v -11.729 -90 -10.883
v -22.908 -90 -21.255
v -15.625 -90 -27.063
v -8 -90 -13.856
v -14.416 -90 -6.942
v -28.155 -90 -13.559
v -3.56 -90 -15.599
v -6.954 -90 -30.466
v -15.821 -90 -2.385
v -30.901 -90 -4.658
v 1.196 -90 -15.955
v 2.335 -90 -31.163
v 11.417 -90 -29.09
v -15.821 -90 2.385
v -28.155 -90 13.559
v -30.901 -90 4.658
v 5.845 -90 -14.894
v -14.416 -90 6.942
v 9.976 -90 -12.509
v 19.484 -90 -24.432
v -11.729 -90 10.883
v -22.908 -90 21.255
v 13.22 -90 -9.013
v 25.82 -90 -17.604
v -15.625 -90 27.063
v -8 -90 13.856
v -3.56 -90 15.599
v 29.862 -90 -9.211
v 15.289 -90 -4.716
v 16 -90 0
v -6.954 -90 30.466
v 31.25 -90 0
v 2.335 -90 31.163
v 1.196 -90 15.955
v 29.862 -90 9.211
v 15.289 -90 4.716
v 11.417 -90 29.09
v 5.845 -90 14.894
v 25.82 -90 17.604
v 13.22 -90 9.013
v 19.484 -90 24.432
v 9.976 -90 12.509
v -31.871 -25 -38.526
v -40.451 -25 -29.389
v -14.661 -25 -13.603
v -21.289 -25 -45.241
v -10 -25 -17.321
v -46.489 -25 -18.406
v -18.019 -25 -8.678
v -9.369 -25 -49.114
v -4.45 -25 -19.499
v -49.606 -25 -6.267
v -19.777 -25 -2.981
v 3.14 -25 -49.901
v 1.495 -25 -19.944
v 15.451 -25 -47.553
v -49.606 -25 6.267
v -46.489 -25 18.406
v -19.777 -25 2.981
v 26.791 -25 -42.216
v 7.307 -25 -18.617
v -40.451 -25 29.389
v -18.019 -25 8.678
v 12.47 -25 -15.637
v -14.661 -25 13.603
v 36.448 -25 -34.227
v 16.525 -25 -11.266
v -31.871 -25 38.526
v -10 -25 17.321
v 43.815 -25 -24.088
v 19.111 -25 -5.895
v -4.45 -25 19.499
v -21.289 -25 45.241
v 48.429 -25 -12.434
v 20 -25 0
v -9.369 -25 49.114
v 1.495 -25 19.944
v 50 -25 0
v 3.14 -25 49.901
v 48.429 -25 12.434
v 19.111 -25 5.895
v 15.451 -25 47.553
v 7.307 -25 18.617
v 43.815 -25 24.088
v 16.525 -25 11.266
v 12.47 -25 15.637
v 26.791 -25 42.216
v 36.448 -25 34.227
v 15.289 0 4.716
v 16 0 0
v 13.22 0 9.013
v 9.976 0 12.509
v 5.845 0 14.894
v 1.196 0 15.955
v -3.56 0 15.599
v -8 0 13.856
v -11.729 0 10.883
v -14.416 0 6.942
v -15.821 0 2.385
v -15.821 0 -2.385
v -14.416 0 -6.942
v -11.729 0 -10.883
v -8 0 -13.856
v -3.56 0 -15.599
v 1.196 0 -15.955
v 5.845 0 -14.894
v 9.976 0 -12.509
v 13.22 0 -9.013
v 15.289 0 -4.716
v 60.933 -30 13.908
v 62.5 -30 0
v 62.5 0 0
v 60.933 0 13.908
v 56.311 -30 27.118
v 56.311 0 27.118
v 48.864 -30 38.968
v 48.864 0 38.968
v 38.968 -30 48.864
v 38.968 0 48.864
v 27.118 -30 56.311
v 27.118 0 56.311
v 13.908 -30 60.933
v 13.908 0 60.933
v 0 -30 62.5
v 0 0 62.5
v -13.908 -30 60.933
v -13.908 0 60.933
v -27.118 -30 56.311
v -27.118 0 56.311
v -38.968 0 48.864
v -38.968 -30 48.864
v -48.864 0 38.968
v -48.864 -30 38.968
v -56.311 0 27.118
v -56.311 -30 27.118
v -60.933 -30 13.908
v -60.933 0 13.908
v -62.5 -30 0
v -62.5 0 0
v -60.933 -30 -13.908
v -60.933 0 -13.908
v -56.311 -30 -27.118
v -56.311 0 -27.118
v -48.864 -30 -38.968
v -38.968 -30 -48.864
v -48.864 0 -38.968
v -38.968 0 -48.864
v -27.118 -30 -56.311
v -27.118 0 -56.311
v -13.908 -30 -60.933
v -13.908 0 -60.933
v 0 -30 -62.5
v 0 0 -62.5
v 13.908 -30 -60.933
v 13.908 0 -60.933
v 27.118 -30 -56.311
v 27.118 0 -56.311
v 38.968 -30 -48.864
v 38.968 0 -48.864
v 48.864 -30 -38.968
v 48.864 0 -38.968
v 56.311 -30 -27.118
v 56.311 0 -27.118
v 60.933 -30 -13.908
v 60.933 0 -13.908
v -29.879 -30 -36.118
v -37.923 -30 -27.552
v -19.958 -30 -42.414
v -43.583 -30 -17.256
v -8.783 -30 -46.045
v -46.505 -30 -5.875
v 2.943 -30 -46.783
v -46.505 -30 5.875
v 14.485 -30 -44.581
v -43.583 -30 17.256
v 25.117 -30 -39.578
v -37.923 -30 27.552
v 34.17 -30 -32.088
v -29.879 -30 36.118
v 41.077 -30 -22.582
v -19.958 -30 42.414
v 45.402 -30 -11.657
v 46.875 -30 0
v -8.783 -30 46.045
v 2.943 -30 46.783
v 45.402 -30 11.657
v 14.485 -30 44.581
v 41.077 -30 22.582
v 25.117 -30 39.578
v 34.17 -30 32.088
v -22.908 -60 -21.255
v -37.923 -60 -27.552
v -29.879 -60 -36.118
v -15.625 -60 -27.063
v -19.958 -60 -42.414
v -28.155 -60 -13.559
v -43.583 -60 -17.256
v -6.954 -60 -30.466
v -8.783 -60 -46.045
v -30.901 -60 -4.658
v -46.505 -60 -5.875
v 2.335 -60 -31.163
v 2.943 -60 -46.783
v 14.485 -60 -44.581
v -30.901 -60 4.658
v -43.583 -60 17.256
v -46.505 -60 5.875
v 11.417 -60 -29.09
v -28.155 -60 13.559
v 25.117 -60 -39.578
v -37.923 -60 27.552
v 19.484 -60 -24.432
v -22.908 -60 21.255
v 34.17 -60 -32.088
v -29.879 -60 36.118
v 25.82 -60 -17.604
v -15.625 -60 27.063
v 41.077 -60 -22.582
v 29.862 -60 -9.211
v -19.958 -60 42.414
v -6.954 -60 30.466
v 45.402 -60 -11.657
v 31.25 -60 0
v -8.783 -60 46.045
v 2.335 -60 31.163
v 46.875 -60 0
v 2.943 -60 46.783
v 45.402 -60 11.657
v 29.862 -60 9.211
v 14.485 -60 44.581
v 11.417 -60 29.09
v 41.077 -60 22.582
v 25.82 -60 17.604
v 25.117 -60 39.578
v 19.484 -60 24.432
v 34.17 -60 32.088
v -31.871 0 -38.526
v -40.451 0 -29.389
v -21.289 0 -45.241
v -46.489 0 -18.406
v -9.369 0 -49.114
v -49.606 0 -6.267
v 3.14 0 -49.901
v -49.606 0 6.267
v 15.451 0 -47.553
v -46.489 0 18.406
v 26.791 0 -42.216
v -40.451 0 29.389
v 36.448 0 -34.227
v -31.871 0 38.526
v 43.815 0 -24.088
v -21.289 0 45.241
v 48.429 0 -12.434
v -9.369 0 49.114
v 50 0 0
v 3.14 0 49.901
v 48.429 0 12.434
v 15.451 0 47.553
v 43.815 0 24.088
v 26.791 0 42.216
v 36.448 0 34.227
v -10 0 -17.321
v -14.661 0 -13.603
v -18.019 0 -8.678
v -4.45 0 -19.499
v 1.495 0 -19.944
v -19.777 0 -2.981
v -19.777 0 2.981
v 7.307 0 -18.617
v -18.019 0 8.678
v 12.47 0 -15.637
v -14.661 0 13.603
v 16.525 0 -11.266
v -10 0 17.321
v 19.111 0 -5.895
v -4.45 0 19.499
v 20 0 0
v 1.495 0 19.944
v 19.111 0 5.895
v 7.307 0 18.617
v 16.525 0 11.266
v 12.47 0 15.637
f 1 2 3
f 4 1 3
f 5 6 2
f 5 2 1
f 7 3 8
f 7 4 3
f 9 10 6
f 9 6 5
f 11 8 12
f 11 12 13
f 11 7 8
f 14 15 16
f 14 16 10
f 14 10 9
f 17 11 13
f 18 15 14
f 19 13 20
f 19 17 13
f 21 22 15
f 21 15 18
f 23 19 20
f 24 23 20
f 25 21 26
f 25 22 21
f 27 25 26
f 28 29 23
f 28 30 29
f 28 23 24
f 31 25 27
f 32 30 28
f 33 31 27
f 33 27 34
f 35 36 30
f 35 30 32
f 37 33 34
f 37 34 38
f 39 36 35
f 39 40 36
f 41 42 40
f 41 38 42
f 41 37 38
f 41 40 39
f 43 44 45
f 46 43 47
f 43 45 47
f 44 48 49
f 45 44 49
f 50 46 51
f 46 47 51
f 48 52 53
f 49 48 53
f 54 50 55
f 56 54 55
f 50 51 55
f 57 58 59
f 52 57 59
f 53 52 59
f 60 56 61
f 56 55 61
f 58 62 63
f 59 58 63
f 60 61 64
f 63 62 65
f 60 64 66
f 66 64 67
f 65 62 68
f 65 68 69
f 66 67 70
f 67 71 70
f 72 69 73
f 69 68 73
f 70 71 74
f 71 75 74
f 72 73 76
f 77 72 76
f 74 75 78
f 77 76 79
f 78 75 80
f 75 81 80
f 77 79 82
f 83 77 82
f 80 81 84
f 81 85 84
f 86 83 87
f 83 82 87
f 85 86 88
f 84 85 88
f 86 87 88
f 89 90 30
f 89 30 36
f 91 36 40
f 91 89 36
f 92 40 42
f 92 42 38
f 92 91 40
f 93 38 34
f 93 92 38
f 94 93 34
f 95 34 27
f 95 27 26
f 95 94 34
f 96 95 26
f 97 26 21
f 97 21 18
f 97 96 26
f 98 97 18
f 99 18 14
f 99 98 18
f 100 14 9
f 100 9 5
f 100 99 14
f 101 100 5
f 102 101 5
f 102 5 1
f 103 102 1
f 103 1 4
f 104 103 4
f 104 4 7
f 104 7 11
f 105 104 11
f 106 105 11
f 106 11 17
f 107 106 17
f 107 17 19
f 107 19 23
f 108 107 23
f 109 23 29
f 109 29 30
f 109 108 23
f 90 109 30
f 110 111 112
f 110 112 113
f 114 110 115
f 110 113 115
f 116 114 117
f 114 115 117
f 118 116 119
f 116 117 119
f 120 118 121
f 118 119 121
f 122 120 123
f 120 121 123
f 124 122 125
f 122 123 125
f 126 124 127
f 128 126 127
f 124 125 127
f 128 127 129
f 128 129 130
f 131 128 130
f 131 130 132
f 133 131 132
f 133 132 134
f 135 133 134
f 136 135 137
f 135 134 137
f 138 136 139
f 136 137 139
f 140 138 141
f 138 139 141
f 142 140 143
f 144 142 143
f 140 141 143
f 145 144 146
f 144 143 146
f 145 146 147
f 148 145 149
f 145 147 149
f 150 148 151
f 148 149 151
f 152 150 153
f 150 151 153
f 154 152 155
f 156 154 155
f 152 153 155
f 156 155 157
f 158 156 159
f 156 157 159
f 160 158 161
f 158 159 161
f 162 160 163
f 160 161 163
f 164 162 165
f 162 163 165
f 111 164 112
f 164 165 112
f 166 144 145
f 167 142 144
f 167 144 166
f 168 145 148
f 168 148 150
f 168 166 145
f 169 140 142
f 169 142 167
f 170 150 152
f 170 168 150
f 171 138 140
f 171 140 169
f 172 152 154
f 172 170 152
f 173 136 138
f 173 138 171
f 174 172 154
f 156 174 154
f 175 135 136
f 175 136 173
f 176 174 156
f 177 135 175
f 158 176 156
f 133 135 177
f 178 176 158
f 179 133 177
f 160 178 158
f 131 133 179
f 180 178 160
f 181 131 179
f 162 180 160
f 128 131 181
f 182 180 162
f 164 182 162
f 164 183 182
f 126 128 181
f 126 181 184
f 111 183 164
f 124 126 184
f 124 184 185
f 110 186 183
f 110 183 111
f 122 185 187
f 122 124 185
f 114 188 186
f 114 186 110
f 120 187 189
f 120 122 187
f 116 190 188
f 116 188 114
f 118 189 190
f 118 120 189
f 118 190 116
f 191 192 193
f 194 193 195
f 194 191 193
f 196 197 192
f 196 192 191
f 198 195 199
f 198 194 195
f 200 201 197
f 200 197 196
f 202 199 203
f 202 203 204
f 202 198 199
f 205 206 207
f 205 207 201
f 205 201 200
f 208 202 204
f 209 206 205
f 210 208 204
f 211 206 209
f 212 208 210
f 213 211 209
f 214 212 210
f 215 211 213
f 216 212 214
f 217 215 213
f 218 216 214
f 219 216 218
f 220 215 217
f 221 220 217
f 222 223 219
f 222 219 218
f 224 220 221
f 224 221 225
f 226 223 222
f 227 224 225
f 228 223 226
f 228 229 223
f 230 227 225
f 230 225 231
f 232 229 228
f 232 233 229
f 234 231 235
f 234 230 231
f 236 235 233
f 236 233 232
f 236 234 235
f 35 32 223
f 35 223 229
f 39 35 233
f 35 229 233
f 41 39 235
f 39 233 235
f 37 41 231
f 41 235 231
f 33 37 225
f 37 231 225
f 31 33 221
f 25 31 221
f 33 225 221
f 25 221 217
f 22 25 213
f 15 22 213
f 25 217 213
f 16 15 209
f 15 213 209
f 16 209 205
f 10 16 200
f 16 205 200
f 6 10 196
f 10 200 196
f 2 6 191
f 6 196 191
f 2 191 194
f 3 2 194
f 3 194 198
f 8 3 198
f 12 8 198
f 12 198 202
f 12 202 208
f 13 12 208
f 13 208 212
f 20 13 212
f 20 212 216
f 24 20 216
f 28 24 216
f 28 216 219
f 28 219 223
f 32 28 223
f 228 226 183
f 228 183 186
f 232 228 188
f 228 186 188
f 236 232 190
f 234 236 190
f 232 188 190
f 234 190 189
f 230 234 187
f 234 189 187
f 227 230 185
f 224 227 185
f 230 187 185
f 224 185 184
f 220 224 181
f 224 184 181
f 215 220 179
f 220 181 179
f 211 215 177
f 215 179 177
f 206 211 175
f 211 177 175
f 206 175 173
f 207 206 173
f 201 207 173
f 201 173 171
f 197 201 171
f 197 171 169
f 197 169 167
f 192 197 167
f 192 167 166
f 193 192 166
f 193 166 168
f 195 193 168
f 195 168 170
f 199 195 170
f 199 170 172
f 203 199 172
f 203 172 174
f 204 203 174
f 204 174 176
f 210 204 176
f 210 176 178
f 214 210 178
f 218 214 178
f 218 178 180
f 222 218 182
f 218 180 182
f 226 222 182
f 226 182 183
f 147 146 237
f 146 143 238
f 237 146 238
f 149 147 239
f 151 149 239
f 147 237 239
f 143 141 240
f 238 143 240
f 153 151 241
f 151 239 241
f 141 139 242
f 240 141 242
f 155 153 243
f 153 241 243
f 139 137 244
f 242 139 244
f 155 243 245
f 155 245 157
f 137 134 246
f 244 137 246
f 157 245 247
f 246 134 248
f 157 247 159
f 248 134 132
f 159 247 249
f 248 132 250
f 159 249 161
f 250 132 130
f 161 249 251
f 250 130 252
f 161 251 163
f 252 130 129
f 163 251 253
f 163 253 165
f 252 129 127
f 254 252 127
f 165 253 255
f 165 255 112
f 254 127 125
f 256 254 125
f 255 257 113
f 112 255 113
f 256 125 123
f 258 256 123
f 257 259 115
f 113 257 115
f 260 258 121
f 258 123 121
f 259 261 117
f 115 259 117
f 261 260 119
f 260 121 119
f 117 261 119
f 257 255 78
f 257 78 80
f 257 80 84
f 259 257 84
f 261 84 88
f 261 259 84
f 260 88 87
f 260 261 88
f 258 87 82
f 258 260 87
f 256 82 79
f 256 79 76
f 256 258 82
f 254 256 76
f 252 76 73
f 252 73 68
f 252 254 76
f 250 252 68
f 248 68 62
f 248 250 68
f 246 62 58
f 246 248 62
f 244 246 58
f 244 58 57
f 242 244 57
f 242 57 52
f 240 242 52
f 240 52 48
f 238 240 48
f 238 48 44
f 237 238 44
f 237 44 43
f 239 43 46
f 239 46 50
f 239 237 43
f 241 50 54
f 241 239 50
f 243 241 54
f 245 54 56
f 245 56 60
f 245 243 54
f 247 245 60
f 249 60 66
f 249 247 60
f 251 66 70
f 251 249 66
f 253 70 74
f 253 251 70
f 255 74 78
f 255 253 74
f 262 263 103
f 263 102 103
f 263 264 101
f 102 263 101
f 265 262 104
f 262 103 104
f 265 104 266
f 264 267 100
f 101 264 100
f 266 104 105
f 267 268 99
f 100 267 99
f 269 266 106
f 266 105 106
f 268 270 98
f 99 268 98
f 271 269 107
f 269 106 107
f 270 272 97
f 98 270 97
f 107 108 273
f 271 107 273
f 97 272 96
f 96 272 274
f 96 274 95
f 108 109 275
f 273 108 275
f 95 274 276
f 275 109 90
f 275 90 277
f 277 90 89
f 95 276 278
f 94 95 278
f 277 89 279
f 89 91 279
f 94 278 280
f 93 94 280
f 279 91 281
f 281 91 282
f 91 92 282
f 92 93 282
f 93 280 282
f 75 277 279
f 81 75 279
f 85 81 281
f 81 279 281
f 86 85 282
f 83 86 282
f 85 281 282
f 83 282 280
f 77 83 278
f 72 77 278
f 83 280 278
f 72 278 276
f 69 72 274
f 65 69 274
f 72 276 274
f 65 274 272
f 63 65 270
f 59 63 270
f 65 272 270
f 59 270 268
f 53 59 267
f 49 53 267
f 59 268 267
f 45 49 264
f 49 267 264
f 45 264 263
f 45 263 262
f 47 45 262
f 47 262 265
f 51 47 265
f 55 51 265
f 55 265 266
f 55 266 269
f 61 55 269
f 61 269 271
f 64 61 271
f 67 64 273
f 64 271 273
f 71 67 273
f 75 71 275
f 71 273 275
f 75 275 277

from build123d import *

# Parameters (mm, degrees)
F0_R     = 31.25
F0_R_2   = 16
F1_DEPTH = 90
F0_R_3   = 46.875
F2_DEPTH = 60
F0_R_4   = 62.5
F3_DEPTH = 30
F4_R     = 50
F4_R_2   = 20
F5_DEPTH = 25


with BuildPart() as f1:
    # F0 (on Front) → F1 (new body)
    with BuildSketch(Plane.XZ):
        Circle(F0_R)
        Circle(F0_R_2, mode=Mode.SUBTRACT)
    extrude(amount=F1_DEPTH)

    # F0 (on Front) → F2 (join)
    with BuildSketch(Plane.XZ):
        Circle(F0_R_3)
        Circle(F0_R, mode=Mode.SUBTRACT)
    extrude(amount=F2_DEPTH)

    # F0 (on Front) → F3 (join)
    with BuildSketch(Plane.XZ):
        Circle(F0_R_4)
        Circle(F0_R_3, mode=Mode.SUBTRACT)
    extrude(amount=F3_DEPTH)

    # F4 (on Front) → F5 (cut)
    with BuildSketch(Plane.XZ):
        Circle(F4_R)
        Circle(F4_R_2, mode=Mode.SUBTRACT)
    extrude(amount=F5_DEPTH, mode=Mode.SUBTRACT)


solid = f1.part
